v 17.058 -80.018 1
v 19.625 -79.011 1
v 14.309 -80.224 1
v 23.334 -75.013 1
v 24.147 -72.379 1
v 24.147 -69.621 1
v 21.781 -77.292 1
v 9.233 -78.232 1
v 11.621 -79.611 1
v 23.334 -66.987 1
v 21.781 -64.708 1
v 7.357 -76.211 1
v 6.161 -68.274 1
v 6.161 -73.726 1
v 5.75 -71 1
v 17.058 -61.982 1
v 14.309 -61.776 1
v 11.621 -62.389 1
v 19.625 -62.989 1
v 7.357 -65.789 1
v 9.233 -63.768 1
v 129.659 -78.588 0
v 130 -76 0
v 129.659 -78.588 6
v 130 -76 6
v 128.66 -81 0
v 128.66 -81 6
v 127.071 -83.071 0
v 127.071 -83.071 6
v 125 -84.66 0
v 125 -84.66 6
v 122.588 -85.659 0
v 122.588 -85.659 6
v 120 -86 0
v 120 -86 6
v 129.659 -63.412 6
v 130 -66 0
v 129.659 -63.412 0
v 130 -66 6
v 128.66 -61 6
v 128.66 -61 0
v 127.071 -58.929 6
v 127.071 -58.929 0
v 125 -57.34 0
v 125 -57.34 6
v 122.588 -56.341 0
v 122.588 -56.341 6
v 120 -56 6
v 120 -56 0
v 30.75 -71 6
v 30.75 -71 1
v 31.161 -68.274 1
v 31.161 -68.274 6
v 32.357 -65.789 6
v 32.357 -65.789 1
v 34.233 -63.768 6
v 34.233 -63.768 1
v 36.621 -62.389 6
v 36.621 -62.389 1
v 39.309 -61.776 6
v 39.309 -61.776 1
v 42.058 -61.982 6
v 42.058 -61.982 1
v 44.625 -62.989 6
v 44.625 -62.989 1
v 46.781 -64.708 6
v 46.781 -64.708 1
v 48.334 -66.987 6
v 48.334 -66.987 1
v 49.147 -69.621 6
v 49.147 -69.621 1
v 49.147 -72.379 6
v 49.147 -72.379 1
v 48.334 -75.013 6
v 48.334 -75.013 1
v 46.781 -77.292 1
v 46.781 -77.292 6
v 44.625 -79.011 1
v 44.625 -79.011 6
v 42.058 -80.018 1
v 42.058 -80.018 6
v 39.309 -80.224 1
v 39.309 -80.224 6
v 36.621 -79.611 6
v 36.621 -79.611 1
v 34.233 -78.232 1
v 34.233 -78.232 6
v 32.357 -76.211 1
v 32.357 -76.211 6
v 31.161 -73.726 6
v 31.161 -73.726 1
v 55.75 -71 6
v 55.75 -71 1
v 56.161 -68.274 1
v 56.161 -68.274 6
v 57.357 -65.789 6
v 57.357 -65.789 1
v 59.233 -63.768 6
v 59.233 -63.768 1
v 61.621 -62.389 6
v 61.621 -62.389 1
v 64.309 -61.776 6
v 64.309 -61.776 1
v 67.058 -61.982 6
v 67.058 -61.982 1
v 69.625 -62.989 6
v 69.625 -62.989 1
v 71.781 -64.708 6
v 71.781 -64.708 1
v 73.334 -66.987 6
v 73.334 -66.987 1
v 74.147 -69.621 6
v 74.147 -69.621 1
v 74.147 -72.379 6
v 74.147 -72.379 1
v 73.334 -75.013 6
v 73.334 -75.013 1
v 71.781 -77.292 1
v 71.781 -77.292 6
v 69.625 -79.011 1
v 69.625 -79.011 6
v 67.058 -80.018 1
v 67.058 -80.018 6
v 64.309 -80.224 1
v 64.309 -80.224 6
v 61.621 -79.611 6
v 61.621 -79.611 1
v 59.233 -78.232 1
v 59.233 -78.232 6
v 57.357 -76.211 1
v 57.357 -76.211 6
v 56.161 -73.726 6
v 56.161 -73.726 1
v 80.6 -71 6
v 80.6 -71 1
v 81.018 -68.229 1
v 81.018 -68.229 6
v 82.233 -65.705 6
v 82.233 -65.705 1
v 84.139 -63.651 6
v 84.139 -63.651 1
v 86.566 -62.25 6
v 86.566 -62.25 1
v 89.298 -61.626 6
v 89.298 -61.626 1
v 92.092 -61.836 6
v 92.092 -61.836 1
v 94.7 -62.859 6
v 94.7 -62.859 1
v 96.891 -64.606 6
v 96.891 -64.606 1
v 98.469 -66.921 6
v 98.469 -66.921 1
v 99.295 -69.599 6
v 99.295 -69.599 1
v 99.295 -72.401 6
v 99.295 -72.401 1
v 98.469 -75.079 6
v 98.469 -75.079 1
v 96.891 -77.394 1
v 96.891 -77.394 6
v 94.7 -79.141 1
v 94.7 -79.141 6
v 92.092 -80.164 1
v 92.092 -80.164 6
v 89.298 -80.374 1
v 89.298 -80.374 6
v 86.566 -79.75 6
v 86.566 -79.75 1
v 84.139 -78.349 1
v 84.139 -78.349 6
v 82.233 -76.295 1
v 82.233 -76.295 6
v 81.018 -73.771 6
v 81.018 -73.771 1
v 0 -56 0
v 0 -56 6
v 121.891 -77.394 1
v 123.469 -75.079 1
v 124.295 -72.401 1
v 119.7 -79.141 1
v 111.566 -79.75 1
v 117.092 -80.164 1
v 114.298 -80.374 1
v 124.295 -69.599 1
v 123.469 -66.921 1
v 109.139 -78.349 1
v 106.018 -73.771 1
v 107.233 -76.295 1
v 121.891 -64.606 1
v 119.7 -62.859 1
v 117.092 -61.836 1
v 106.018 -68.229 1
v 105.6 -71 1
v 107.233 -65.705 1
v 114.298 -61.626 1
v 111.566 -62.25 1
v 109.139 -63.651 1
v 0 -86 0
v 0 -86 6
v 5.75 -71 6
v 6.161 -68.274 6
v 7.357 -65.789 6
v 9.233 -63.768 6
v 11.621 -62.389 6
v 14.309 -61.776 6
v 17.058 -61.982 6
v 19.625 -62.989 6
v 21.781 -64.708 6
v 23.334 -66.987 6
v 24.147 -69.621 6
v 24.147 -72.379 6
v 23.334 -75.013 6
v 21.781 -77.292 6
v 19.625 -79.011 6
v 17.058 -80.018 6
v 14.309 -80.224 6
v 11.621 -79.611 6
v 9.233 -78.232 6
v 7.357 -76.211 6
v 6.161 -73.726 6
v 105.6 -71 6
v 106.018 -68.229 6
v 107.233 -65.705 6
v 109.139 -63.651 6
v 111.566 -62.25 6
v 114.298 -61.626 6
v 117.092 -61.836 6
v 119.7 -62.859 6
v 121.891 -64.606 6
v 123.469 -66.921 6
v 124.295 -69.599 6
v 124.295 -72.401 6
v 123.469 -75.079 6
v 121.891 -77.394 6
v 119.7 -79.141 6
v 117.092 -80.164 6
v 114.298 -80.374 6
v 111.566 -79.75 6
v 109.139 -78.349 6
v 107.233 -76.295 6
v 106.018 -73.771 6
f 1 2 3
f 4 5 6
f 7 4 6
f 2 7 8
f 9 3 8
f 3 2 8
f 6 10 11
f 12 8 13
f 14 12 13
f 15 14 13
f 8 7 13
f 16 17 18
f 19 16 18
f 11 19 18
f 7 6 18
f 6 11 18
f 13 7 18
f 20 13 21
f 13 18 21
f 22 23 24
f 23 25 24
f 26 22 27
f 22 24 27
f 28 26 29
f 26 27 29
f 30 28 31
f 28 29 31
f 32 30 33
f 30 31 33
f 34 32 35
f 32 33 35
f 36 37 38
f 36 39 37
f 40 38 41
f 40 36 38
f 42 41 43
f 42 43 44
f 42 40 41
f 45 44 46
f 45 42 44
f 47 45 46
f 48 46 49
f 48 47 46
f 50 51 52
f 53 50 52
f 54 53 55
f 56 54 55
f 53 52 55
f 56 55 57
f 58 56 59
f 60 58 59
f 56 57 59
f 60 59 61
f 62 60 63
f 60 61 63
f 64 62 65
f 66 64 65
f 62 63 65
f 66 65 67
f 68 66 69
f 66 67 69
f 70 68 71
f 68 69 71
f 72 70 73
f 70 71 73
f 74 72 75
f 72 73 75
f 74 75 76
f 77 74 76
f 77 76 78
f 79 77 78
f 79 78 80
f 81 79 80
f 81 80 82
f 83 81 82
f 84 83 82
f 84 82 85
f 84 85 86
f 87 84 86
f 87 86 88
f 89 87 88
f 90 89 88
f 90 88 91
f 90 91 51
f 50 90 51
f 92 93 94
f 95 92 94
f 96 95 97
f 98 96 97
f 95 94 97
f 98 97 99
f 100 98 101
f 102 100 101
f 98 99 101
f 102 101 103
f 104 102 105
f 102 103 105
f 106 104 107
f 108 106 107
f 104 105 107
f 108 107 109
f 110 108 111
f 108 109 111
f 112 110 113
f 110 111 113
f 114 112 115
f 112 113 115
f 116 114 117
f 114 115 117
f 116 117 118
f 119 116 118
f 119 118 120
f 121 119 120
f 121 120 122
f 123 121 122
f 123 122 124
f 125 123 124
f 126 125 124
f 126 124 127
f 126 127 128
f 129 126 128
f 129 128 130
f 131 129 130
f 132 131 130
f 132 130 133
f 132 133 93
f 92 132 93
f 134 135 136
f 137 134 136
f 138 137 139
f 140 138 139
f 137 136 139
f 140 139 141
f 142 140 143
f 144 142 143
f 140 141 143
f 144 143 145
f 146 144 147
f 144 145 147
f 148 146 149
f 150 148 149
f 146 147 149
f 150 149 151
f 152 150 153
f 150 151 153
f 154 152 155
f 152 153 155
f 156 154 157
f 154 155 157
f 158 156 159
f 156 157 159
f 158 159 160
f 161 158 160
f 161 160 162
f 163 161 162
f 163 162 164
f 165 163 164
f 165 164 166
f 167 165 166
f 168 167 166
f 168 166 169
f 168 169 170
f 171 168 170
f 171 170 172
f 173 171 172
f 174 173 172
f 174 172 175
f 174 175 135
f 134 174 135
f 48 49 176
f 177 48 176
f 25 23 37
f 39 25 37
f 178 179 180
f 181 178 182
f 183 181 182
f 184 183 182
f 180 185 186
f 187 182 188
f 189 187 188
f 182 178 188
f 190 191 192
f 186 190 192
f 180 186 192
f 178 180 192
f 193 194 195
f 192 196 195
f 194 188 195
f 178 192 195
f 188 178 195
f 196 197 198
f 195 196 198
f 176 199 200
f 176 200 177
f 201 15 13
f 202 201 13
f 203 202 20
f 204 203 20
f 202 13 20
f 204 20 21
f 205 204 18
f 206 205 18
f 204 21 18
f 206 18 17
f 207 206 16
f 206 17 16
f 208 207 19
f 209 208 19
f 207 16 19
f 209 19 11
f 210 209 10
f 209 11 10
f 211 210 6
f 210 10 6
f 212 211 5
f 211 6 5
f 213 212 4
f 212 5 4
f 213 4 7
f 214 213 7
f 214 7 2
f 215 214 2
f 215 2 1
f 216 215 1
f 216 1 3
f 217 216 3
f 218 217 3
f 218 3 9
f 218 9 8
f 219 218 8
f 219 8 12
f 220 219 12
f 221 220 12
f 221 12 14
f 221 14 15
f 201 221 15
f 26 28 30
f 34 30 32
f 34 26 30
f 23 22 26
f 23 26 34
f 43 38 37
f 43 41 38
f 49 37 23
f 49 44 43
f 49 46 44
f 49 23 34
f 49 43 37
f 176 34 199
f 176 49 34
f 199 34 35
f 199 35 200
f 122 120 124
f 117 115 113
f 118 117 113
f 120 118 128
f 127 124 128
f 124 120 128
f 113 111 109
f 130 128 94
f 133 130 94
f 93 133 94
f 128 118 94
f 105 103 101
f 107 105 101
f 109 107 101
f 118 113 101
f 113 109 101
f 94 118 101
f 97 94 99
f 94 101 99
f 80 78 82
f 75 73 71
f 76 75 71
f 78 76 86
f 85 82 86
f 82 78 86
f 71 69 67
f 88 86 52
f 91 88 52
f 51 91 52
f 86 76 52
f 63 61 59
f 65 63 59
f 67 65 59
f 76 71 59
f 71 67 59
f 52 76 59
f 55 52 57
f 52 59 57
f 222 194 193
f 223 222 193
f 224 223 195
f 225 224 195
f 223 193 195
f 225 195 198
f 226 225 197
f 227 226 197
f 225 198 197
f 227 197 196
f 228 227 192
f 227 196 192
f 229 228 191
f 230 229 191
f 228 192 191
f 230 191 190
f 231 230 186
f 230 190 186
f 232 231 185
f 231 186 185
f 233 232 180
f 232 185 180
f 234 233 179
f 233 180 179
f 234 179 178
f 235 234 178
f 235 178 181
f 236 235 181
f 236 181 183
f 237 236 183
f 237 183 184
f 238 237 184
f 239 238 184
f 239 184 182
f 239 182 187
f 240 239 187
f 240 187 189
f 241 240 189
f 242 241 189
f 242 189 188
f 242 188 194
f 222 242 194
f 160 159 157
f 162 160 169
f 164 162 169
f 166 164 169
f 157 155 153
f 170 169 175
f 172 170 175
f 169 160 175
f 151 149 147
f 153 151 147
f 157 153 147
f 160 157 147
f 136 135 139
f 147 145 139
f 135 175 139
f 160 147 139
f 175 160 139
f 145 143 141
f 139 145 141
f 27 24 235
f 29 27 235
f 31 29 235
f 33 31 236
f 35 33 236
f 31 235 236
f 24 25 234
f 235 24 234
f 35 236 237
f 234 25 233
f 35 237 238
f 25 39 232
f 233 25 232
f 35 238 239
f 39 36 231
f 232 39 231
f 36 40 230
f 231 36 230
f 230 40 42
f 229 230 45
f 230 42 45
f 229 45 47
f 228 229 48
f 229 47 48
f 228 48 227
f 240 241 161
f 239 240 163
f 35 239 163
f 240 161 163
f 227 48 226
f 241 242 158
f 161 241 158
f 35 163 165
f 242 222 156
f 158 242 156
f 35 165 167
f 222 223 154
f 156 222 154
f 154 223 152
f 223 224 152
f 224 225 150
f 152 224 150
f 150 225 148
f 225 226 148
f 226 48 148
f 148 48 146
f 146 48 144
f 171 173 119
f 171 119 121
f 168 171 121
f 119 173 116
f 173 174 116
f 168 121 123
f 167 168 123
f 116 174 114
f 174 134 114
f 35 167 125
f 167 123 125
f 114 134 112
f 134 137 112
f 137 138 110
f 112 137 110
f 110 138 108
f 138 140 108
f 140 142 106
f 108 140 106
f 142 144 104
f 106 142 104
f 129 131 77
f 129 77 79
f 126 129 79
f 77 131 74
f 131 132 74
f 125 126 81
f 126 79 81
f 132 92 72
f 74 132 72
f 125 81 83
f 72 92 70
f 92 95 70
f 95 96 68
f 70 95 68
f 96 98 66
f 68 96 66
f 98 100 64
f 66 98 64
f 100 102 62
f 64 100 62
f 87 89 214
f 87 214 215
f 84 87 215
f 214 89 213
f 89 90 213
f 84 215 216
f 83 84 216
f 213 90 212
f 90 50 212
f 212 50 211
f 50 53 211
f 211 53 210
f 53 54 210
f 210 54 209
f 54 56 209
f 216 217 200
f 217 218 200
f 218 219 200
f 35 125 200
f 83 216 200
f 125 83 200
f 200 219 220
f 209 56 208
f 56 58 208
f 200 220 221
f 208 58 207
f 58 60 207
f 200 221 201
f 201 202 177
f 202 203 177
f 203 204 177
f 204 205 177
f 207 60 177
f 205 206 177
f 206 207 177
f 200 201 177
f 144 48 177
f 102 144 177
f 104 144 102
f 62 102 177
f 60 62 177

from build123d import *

# Parameters (mm, degrees)
SKETCH_1_W                    = 130
SKETCH_1_H                    = 30
EXTRUDE_1_DEPTH               = 6
HOLE_WIZARD_M16_1_D           = 18.8
HOLE_WIZARD_M16_1_DEPTH       = 5
HOLE_WIZARD_18_5_18_5_1_D     = 18.5
HOLE_WIZARD_18_5_18_5_1_DEPTH = 5
FILLET_1_R                    = 10


with BuildPart() as part:
    # 草图1 → 凸台-拉伸1 (new body)
    with BuildSketch(Plane(origin=(0, 0, 0), x_dir=(-1, 0, 0), z_dir=(0, 0, -1))):
        with Locations((-65, -71)):
            Rectangle(SKETCH_1_W, SKETCH_1_H)
    extrude(amount=-EXTRUDE_1_DEPTH)

    # M16 间隙孔1
    with Locations(Plane.XY.offset(6)):
        with Locations((90, -71), (115, -71)):
            Hole(HOLE_WIZARD_M16_1_D / 2, depth=HOLE_WIZARD_M16_1_DEPTH)

    # Ø18.5 (18.5) 直径孔1
    with Locations(Plane.XY.offset(6)):
        with Locations((15, -71), (40, -71), (65, -71)):
            Hole(HOLE_WIZARD_18_5_18_5_1_D / 2, depth=HOLE_WIZARD_18_5_18_5_1_DEPTH)

    # 圆角1
    fillet_1_edges = [part.edges().sort_by_distance(p)[0] for p in [
        (130, -86, 3),
        (130, -56, 3),
    ]]
    fillet(fillet_1_edges, radius=FILLET_1_R)


solid = part.part
